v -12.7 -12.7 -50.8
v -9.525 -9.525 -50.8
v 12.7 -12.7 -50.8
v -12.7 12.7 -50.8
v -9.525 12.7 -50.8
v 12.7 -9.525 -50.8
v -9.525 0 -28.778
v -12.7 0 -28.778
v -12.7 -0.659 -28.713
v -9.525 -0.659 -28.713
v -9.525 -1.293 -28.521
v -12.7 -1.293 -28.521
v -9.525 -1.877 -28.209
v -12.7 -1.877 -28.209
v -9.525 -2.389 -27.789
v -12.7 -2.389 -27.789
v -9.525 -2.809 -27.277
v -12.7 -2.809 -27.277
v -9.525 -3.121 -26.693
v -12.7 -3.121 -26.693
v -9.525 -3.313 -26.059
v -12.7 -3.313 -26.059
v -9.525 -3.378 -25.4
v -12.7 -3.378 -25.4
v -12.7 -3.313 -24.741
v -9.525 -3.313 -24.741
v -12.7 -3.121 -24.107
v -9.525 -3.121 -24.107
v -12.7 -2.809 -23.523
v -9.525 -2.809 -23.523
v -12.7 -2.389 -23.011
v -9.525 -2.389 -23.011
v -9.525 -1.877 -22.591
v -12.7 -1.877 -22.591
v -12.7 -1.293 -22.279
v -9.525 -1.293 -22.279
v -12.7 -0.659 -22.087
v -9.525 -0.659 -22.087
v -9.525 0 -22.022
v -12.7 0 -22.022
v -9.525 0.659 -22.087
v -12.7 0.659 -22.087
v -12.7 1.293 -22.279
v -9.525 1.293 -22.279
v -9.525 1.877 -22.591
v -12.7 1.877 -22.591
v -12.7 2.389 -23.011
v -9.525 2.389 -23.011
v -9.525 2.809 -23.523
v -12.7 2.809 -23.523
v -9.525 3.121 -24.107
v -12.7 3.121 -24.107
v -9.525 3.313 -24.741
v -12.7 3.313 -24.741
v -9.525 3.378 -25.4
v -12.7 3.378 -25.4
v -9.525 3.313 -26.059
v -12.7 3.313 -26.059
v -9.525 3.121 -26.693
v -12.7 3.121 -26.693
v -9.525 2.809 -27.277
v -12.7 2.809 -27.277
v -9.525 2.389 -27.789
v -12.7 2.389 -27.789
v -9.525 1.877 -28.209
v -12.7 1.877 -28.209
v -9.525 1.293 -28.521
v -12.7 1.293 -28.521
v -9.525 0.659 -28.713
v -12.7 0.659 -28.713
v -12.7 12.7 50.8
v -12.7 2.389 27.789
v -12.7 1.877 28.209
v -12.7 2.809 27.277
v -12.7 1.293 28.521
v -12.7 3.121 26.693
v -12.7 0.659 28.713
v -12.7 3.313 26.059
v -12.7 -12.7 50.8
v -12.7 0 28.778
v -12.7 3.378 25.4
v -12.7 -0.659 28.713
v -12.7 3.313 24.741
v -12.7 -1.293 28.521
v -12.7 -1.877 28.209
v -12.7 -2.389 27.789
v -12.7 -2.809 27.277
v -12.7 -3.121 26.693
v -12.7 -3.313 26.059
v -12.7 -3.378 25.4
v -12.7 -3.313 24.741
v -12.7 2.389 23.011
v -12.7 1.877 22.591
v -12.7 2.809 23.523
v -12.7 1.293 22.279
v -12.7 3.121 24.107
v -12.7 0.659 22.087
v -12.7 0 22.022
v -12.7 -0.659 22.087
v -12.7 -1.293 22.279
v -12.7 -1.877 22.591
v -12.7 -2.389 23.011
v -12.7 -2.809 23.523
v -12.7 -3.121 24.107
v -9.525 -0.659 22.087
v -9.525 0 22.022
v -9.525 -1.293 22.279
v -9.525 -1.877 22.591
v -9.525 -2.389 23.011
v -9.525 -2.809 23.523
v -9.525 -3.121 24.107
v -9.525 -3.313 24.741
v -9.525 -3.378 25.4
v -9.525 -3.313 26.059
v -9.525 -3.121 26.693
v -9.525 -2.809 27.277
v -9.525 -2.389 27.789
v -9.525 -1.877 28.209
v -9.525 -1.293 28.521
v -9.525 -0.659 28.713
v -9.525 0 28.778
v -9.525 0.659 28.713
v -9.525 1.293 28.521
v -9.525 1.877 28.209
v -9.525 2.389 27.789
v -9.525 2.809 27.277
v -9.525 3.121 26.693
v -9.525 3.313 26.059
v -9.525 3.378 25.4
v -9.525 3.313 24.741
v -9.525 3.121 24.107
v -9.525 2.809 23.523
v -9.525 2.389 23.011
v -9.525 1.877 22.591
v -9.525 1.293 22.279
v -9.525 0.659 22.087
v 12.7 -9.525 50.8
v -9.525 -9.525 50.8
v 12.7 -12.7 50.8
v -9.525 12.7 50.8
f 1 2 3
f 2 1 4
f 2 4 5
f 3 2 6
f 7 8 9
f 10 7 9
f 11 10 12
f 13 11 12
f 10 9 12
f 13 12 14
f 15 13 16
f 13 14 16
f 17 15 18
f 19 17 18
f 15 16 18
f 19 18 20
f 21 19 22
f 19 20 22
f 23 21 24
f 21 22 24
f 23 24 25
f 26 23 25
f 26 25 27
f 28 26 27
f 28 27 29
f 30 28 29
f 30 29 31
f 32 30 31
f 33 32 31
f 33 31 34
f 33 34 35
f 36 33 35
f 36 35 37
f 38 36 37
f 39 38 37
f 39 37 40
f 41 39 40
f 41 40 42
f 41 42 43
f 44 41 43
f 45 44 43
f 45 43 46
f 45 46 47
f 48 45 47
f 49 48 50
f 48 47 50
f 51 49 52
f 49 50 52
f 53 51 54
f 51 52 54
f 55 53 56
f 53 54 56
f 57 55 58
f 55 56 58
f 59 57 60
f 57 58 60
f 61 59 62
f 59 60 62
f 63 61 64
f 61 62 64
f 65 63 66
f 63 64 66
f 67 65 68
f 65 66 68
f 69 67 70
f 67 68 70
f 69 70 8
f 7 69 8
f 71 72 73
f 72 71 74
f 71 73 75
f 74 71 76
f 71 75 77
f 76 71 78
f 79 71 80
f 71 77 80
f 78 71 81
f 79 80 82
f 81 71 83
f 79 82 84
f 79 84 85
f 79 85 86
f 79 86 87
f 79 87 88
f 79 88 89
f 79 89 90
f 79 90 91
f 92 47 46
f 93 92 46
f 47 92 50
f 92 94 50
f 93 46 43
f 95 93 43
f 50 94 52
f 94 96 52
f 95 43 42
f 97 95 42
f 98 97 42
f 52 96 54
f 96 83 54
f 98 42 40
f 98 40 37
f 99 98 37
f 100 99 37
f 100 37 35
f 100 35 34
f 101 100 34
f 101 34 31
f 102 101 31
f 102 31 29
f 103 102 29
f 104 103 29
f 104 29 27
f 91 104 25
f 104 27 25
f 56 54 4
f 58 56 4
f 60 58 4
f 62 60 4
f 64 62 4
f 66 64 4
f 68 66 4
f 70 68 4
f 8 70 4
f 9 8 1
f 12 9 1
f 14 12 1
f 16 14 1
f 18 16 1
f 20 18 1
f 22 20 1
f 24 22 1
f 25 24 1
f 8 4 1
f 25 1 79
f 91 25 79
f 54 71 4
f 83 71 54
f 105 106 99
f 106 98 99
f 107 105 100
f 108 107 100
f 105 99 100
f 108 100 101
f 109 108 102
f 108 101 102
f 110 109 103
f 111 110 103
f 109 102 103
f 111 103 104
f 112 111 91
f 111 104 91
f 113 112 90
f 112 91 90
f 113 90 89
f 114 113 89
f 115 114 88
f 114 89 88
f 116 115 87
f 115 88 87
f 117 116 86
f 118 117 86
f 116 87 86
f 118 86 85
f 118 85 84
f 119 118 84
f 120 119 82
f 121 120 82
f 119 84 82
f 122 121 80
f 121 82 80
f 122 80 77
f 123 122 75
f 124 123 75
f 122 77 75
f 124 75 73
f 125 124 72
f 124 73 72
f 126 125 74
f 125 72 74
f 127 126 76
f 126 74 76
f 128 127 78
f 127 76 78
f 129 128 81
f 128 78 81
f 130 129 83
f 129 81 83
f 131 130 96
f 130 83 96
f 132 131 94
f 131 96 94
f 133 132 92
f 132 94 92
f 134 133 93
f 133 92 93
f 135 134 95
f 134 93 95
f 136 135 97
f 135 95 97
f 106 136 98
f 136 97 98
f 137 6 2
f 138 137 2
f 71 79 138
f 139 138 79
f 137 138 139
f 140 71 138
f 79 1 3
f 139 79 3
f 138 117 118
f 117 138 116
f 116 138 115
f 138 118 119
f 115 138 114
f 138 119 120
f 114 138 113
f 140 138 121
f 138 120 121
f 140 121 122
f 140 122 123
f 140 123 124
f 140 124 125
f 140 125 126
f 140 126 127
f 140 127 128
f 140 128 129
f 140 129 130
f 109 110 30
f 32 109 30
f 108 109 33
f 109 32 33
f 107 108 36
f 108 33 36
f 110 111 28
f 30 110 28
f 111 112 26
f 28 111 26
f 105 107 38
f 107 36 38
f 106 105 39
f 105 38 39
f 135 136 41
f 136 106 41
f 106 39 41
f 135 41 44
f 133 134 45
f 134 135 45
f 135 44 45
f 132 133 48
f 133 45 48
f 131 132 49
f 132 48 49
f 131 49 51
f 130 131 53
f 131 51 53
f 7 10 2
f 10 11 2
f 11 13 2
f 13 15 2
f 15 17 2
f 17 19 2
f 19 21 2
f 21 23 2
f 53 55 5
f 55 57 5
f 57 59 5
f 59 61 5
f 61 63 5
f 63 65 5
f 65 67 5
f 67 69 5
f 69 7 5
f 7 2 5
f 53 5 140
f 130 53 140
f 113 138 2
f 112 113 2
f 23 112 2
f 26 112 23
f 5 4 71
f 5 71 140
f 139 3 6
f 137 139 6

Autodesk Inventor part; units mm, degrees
ref_plane "YZ Plane" through (0, 0, 0) normal (1, 0, 0) x (0, 1, 0)
ref_plane "XZ Plane" through (0, 0, 0) normal (0, 1, 0) x (-1, 0, 0)
ref_plane "XY Plane" through (0, 0, 0) normal (0, 0, 1) x (1, 0, 0)
sketch "Sketch1" plane through (0, 0, 0) normal (0, 0, 1) x (1, 0, 0)
  line L0 (-17.78, 0) -> (17.78, 0) projected
  line L1 (0, -17.78) -> (0, 17.78) projected
  line L2 (-12.7, 12.7) -> (-12.7, -12.7)
  line L3 (-12.7, -12.7) -> (12.7, -12.7)
  line L4 (12.7, -9.525) -> (-9.525, -9.525)
  line L5 (-9.525, -9.525) -> (-9.525, 12.7)
  line L6 (-12.7, 12.7) -> (-9.525, 12.7)
  line L7 (12.7, -12.7) -> (12.7, -9.525)
  point P0 (0, 0)
  point P1 (-12.7, 0)
  point P2 (0, -12.7)
  dimension "d0" = 25.4
  dimension "d1" = 3.175
extrude "Extrusion1" add sketch "Sketch1" along normal mid plane 101.6 contours L2 L6 L5 L0 | L0 L5 L4 L1 L3 L2 | L1 L4 L7 L3
sketch "Sketch2" plane through (-9.525, -9.525, 50.8) normal (1, 0, 0) x (0, 0, -1)
  line L0 (0, 22.225) -> (0, 0) projected
  point P0 (50.8, 9.525)
  point P1 (25.4, 9.525)
  point P2 (76.2, 9.525)
  dimension "d4" = 50.8
  dimension "d5" = 25.4
hole "Hole1" at (-9.525, 0, 25.4) at (-9.525, 0, -25.4) direction (-1, 0, 0) diameter 6.7564 end through all clearance for "Flat Head Machine Screw (82)" size "1/4" standard "Ansi Unified Screw Threads"
properties part number "angle template al-6061 1x1x0.125" material "Aluminum-6061"
